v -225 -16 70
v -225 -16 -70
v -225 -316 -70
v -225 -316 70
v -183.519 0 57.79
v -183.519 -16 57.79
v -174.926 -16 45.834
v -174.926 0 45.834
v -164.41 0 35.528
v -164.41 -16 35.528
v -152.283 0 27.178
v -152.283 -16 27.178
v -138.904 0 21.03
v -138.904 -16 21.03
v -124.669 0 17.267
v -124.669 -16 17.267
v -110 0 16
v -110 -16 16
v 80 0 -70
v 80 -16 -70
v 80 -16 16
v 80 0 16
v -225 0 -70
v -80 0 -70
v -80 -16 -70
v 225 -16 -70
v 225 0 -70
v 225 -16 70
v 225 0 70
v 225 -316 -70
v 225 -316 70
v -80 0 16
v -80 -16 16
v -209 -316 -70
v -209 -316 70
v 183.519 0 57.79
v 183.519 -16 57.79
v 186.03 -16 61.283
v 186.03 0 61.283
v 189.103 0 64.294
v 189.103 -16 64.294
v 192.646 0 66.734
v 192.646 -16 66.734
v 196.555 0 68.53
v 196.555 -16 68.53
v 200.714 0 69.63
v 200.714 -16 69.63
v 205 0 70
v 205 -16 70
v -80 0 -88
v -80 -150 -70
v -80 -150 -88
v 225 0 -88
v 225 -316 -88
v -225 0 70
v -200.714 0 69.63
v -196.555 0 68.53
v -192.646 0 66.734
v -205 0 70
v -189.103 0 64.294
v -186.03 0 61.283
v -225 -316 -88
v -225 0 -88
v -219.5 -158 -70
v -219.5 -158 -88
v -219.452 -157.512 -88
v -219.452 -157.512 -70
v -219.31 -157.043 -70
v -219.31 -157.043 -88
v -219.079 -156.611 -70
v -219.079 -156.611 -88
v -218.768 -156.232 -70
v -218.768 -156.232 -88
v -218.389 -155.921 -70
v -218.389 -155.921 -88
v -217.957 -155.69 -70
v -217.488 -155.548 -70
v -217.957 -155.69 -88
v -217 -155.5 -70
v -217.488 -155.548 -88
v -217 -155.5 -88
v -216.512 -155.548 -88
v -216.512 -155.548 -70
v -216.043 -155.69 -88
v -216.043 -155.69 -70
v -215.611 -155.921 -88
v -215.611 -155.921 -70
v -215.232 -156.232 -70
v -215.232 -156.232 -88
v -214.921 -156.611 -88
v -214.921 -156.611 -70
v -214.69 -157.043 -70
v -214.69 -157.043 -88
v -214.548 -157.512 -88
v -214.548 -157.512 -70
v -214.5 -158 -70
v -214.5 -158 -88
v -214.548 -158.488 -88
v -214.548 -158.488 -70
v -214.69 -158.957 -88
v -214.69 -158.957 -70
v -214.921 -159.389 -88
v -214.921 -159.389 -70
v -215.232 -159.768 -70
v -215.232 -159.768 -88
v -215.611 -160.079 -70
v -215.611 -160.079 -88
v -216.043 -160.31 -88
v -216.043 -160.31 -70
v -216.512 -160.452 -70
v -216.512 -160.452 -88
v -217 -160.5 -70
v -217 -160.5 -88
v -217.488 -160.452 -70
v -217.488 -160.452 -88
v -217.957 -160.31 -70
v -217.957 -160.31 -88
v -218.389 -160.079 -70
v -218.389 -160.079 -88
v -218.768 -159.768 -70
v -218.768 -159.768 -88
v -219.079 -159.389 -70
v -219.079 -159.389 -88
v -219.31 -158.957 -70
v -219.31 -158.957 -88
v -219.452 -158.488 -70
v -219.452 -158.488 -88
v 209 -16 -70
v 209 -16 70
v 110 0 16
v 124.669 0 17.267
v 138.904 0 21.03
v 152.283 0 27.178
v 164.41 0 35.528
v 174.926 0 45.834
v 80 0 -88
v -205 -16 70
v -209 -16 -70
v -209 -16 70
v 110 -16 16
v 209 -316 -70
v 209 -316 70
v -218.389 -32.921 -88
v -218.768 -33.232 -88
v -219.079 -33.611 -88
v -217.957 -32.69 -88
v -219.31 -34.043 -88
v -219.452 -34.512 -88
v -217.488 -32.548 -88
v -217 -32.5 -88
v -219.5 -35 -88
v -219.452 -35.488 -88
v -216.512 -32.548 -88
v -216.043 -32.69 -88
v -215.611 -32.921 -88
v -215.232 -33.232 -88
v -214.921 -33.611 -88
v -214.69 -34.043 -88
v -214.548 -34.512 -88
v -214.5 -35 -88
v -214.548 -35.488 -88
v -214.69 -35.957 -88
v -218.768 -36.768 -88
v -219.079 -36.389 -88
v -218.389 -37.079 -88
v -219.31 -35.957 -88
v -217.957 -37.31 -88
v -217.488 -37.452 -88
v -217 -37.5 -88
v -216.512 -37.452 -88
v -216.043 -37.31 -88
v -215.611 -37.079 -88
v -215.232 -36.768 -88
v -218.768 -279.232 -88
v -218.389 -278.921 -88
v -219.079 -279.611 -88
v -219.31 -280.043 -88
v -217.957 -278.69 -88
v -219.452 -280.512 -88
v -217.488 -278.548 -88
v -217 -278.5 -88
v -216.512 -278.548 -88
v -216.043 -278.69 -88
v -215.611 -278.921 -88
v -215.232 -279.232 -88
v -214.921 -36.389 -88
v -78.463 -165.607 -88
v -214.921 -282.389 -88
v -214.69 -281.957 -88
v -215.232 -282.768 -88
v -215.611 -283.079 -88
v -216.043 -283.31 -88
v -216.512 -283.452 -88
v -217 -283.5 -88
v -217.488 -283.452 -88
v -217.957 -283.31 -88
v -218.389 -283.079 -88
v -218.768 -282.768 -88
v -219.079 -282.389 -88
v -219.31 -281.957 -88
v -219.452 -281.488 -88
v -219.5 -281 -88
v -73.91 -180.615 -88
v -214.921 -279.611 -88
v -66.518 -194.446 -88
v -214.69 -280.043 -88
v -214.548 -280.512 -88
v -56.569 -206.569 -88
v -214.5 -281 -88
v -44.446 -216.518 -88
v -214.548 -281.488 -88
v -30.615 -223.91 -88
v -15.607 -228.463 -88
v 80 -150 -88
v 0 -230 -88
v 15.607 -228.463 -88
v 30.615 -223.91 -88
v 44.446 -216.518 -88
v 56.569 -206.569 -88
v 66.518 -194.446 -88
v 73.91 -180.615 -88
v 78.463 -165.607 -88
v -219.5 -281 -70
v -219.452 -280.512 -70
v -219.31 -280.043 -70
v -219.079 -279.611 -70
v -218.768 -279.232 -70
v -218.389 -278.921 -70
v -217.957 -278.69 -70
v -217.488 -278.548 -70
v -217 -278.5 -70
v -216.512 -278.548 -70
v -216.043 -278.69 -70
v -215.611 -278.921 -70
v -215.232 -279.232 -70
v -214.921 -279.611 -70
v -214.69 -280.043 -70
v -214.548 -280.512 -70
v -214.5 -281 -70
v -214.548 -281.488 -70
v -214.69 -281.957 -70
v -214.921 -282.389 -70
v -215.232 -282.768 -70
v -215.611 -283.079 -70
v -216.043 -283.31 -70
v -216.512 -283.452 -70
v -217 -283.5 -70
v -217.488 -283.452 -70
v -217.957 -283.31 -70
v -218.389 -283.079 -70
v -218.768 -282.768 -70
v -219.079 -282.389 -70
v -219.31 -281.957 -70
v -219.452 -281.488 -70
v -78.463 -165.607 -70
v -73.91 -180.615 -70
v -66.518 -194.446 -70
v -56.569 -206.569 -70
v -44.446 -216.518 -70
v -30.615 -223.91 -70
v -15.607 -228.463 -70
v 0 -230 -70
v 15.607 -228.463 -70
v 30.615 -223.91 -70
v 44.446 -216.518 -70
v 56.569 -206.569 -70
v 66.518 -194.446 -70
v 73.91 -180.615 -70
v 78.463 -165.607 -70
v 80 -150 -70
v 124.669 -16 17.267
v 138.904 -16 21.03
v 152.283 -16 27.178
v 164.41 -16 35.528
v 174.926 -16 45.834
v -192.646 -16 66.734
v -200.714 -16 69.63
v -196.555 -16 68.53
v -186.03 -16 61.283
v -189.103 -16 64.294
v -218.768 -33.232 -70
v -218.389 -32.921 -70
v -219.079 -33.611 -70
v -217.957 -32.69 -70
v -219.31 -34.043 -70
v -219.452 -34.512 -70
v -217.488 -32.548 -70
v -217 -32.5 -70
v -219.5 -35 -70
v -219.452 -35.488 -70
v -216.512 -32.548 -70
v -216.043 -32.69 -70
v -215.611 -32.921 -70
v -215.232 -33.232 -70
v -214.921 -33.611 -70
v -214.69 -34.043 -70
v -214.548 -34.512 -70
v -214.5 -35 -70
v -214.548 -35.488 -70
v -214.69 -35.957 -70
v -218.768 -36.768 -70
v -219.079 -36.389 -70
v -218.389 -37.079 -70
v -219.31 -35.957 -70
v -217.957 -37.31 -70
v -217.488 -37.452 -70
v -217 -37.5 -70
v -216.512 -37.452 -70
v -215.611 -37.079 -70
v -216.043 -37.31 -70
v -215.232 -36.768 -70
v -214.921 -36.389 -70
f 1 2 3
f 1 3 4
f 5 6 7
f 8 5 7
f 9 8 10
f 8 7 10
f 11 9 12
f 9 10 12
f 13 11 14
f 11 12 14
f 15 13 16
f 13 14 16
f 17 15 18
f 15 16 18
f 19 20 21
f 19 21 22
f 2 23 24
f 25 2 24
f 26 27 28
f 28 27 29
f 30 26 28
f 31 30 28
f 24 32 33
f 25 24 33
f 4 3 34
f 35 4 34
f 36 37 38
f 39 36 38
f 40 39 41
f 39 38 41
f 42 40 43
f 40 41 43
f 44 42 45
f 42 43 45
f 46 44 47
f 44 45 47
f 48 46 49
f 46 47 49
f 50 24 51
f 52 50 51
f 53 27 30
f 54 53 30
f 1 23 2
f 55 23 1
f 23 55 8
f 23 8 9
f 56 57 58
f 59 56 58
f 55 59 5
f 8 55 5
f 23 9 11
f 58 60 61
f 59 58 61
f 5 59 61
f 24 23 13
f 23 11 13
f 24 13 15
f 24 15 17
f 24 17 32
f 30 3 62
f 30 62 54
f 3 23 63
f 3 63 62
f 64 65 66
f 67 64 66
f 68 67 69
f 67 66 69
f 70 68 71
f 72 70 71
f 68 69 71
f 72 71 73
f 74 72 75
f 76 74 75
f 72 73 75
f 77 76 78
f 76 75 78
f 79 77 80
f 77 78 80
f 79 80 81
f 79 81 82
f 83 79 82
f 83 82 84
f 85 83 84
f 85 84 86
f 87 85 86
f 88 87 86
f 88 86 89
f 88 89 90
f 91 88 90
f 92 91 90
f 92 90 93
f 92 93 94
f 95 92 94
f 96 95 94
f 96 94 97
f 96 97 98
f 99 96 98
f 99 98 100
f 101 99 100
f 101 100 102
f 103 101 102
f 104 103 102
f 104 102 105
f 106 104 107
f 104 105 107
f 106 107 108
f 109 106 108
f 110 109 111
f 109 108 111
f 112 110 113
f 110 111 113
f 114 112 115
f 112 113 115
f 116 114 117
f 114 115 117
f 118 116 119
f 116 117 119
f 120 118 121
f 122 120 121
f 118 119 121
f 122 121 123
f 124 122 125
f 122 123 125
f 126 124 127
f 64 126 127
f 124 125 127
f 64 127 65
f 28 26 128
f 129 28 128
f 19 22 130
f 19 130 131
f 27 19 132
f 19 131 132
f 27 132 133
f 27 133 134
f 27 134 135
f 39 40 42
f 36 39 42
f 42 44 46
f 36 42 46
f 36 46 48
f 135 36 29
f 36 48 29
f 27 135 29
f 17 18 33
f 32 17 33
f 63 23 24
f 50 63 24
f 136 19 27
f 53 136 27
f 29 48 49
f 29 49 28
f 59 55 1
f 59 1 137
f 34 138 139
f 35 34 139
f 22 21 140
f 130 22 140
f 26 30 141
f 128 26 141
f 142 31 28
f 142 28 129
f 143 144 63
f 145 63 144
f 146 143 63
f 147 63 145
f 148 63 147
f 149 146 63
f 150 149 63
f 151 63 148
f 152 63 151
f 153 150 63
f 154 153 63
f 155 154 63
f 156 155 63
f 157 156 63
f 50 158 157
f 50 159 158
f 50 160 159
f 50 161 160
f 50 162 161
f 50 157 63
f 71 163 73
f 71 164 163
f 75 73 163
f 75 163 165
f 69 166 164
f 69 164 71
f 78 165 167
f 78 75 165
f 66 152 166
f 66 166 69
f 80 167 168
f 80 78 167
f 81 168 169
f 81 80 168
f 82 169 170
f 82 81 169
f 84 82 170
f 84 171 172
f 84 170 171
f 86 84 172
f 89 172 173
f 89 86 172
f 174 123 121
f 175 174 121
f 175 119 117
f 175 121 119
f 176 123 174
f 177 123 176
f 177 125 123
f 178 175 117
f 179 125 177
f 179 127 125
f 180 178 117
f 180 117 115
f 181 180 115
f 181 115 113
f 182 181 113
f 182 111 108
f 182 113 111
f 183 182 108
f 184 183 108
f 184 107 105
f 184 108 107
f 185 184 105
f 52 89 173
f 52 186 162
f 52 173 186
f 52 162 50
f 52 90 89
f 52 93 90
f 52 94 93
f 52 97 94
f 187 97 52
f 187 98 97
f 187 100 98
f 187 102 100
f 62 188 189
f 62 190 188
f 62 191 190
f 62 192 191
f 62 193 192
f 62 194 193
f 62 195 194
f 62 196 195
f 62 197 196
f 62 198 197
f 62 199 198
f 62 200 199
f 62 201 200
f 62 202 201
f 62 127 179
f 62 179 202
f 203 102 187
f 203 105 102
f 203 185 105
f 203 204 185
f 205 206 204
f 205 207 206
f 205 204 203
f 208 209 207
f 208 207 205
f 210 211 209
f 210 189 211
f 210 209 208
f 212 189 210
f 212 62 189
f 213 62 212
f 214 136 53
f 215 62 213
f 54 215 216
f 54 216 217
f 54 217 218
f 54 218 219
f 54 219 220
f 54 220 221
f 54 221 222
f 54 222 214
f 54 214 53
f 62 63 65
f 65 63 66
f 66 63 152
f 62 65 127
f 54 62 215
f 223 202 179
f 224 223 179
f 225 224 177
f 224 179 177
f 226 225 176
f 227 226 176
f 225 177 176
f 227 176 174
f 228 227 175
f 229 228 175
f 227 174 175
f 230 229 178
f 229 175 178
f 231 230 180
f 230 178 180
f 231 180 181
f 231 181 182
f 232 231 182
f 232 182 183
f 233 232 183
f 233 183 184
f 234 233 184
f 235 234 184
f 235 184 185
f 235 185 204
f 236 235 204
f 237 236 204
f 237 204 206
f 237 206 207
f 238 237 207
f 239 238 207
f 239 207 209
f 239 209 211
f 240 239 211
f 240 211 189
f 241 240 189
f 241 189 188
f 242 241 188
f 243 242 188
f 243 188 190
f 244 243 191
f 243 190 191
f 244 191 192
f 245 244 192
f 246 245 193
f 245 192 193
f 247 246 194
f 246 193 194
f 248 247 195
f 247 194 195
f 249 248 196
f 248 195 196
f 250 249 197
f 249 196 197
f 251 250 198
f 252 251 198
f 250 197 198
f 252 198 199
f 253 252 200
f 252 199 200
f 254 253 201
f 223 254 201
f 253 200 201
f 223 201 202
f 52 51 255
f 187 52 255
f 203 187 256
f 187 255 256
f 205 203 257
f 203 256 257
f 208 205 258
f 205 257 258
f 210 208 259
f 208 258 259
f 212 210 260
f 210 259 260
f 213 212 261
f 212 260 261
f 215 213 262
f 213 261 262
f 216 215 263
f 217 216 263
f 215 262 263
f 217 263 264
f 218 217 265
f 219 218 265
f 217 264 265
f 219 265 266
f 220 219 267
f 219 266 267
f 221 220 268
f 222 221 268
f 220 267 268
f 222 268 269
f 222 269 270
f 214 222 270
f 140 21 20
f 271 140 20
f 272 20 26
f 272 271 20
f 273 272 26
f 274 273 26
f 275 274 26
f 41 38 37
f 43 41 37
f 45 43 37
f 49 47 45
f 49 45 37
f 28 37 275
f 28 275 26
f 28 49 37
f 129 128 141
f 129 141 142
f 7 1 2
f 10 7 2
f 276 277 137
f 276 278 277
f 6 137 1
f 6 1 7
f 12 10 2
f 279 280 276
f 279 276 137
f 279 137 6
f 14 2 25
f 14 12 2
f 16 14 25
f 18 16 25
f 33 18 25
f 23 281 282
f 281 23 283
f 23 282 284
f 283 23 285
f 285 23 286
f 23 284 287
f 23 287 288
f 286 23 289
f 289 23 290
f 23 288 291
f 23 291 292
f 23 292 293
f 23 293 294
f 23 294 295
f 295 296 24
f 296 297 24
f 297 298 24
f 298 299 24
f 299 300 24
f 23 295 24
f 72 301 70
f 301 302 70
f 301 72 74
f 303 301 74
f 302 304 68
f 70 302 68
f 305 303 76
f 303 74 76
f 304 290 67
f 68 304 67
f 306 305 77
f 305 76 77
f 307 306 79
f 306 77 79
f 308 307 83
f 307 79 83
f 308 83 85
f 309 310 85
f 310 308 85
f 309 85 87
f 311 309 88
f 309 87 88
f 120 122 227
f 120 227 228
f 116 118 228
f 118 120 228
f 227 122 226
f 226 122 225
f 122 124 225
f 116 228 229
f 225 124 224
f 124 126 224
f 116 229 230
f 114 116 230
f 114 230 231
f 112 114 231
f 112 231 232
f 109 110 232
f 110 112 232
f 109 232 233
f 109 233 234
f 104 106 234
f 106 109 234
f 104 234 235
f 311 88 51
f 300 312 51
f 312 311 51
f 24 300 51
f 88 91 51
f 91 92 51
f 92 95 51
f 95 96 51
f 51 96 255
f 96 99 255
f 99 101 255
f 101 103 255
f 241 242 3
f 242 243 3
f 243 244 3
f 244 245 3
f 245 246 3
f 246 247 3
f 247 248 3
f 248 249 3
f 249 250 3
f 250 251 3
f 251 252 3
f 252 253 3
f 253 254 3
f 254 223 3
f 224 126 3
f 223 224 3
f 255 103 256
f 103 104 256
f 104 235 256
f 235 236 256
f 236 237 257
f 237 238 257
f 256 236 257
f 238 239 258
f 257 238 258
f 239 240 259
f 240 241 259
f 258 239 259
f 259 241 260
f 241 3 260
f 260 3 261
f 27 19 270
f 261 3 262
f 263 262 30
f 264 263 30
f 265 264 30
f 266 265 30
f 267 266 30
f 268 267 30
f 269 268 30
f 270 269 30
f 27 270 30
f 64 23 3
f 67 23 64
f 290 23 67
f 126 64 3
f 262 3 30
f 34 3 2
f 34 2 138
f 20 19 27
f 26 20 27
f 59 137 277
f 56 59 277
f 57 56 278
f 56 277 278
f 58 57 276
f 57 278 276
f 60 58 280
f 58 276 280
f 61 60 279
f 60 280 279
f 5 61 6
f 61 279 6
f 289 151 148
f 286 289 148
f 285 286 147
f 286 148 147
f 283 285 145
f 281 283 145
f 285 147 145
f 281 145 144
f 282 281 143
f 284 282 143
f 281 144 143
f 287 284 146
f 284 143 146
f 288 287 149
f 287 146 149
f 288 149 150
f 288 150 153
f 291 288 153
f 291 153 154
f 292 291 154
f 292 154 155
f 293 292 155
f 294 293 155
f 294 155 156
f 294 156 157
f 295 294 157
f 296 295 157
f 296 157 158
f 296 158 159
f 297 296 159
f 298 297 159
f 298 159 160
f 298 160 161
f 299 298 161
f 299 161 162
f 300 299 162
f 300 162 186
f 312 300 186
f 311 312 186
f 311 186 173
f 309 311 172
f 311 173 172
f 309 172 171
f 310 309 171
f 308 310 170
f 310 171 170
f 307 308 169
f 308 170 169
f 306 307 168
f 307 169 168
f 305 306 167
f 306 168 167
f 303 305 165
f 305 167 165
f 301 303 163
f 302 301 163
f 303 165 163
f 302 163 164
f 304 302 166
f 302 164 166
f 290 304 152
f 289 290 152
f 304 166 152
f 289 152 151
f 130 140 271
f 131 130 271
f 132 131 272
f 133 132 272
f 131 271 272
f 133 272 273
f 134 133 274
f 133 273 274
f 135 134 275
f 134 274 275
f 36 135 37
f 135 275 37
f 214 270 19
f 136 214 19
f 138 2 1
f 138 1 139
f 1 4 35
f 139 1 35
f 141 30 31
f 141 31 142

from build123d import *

# Parameters (mm, degrees)
F0_W      = 450
F0_H      = 140
F1_DEPTH  = 16
F3_DEPTH  = 16.001
F4_W      = 16
F4_H      = 140
F5_DEPTH  = 300
F7_W      = 450
F7_H      = 316
F8_DEPTH  = 18
F10_DEPTH = 250
F12_D     = 5


with BuildPart() as f1:
    # F0 (on Front) → F1 (new body)
    with BuildSketch(Plane.XZ):
        Rectangle(F0_W, F0_H)
    extrude(amount=F1_DEPTH)

    # F2 (on face) → F3 (cut, through all)
    with BuildSketch(Plane.XZ.offset(16)):
        with BuildLine():
            Line((205, 70), (-205, 70))
            ThreePointArc((-205, 70), (-192.6458343763, 66.7341802639), (-183.519386986, 57.7899673394))
            ThreePointArc((-183.519386986, 57.7899673394), (-152.2832757513, 27.1775704376), (-110, 16))
            Line((-110, 16), (0, 16))
            Line((0, 16), (110, 16))
            ThreePointArc((110, 16), (152.2832757513, 27.1775704376), (183.519386986, 57.7899673394))
            ThreePointArc((183.519386986, 57.7899673394), (192.6458343763, 66.7341802639), (205, 70))
        make_face()
    extrude(amount=-F3_DEPTH, mode=Mode.SUBTRACT)


with BuildPart() as f5:
    # F4 (on face) → F5 (new body)
    with BuildSketch(Plane.XZ.offset(16)):
        with Locations((-217, 0)):
            Rectangle(F4_W, F4_H)
    extrude(amount=F5_DEPTH)


with BuildPart() as f6_1:
    # F6: instance of F5
    add(f5.part.mirror(Plane.YZ))


with BuildPart() as f8:
    # F7 (on face) → F8 (new body)
    with BuildSketch(Plane(origin=(0, 0, -70), x_dir=(1, 0, 0), z_dir=(0, 0, -1))):
        with Locations((0, 158)):
            Rectangle(F7_W, F7_H)
    extrude(amount=F8_DEPTH)


with BuildPart() as f10_tool:
    # F9 (on face) → F10 (new body, symmetric)
    with BuildSketch(Plane.XY.offset(-70)):
        with BuildLine():
            Line((80, 0), (-80, 0))
            Line((-80, 0), (-80, -150))
            ThreePointArc((-80, -150), (0, -230), (80, -150))
            Line((80, -150), (80, 0))
        make_face()
    extrude(amount=F10_DEPTH, both=True)


with BuildPart() as f1_1:
    add(f1.part)

    # F10: cut by f10_tool
    add(f10_tool.part, mode=Mode.SUBTRACT)


with BuildPart() as f8_1:
    add(f8.part)

    # F10: cut by f10_tool
    add(f10_tool.part, mode=Mode.SUBTRACT)

    # F12 (through all)
    with Locations(Plane.XY.offset(-70)):
        with Locations((-217, -158), (-217, -281), (-217, -35)):
            Hole(F12_D / 2)


solid = Compound([f5.part, f6_1.part, f1_1.part, f8_1.part])
